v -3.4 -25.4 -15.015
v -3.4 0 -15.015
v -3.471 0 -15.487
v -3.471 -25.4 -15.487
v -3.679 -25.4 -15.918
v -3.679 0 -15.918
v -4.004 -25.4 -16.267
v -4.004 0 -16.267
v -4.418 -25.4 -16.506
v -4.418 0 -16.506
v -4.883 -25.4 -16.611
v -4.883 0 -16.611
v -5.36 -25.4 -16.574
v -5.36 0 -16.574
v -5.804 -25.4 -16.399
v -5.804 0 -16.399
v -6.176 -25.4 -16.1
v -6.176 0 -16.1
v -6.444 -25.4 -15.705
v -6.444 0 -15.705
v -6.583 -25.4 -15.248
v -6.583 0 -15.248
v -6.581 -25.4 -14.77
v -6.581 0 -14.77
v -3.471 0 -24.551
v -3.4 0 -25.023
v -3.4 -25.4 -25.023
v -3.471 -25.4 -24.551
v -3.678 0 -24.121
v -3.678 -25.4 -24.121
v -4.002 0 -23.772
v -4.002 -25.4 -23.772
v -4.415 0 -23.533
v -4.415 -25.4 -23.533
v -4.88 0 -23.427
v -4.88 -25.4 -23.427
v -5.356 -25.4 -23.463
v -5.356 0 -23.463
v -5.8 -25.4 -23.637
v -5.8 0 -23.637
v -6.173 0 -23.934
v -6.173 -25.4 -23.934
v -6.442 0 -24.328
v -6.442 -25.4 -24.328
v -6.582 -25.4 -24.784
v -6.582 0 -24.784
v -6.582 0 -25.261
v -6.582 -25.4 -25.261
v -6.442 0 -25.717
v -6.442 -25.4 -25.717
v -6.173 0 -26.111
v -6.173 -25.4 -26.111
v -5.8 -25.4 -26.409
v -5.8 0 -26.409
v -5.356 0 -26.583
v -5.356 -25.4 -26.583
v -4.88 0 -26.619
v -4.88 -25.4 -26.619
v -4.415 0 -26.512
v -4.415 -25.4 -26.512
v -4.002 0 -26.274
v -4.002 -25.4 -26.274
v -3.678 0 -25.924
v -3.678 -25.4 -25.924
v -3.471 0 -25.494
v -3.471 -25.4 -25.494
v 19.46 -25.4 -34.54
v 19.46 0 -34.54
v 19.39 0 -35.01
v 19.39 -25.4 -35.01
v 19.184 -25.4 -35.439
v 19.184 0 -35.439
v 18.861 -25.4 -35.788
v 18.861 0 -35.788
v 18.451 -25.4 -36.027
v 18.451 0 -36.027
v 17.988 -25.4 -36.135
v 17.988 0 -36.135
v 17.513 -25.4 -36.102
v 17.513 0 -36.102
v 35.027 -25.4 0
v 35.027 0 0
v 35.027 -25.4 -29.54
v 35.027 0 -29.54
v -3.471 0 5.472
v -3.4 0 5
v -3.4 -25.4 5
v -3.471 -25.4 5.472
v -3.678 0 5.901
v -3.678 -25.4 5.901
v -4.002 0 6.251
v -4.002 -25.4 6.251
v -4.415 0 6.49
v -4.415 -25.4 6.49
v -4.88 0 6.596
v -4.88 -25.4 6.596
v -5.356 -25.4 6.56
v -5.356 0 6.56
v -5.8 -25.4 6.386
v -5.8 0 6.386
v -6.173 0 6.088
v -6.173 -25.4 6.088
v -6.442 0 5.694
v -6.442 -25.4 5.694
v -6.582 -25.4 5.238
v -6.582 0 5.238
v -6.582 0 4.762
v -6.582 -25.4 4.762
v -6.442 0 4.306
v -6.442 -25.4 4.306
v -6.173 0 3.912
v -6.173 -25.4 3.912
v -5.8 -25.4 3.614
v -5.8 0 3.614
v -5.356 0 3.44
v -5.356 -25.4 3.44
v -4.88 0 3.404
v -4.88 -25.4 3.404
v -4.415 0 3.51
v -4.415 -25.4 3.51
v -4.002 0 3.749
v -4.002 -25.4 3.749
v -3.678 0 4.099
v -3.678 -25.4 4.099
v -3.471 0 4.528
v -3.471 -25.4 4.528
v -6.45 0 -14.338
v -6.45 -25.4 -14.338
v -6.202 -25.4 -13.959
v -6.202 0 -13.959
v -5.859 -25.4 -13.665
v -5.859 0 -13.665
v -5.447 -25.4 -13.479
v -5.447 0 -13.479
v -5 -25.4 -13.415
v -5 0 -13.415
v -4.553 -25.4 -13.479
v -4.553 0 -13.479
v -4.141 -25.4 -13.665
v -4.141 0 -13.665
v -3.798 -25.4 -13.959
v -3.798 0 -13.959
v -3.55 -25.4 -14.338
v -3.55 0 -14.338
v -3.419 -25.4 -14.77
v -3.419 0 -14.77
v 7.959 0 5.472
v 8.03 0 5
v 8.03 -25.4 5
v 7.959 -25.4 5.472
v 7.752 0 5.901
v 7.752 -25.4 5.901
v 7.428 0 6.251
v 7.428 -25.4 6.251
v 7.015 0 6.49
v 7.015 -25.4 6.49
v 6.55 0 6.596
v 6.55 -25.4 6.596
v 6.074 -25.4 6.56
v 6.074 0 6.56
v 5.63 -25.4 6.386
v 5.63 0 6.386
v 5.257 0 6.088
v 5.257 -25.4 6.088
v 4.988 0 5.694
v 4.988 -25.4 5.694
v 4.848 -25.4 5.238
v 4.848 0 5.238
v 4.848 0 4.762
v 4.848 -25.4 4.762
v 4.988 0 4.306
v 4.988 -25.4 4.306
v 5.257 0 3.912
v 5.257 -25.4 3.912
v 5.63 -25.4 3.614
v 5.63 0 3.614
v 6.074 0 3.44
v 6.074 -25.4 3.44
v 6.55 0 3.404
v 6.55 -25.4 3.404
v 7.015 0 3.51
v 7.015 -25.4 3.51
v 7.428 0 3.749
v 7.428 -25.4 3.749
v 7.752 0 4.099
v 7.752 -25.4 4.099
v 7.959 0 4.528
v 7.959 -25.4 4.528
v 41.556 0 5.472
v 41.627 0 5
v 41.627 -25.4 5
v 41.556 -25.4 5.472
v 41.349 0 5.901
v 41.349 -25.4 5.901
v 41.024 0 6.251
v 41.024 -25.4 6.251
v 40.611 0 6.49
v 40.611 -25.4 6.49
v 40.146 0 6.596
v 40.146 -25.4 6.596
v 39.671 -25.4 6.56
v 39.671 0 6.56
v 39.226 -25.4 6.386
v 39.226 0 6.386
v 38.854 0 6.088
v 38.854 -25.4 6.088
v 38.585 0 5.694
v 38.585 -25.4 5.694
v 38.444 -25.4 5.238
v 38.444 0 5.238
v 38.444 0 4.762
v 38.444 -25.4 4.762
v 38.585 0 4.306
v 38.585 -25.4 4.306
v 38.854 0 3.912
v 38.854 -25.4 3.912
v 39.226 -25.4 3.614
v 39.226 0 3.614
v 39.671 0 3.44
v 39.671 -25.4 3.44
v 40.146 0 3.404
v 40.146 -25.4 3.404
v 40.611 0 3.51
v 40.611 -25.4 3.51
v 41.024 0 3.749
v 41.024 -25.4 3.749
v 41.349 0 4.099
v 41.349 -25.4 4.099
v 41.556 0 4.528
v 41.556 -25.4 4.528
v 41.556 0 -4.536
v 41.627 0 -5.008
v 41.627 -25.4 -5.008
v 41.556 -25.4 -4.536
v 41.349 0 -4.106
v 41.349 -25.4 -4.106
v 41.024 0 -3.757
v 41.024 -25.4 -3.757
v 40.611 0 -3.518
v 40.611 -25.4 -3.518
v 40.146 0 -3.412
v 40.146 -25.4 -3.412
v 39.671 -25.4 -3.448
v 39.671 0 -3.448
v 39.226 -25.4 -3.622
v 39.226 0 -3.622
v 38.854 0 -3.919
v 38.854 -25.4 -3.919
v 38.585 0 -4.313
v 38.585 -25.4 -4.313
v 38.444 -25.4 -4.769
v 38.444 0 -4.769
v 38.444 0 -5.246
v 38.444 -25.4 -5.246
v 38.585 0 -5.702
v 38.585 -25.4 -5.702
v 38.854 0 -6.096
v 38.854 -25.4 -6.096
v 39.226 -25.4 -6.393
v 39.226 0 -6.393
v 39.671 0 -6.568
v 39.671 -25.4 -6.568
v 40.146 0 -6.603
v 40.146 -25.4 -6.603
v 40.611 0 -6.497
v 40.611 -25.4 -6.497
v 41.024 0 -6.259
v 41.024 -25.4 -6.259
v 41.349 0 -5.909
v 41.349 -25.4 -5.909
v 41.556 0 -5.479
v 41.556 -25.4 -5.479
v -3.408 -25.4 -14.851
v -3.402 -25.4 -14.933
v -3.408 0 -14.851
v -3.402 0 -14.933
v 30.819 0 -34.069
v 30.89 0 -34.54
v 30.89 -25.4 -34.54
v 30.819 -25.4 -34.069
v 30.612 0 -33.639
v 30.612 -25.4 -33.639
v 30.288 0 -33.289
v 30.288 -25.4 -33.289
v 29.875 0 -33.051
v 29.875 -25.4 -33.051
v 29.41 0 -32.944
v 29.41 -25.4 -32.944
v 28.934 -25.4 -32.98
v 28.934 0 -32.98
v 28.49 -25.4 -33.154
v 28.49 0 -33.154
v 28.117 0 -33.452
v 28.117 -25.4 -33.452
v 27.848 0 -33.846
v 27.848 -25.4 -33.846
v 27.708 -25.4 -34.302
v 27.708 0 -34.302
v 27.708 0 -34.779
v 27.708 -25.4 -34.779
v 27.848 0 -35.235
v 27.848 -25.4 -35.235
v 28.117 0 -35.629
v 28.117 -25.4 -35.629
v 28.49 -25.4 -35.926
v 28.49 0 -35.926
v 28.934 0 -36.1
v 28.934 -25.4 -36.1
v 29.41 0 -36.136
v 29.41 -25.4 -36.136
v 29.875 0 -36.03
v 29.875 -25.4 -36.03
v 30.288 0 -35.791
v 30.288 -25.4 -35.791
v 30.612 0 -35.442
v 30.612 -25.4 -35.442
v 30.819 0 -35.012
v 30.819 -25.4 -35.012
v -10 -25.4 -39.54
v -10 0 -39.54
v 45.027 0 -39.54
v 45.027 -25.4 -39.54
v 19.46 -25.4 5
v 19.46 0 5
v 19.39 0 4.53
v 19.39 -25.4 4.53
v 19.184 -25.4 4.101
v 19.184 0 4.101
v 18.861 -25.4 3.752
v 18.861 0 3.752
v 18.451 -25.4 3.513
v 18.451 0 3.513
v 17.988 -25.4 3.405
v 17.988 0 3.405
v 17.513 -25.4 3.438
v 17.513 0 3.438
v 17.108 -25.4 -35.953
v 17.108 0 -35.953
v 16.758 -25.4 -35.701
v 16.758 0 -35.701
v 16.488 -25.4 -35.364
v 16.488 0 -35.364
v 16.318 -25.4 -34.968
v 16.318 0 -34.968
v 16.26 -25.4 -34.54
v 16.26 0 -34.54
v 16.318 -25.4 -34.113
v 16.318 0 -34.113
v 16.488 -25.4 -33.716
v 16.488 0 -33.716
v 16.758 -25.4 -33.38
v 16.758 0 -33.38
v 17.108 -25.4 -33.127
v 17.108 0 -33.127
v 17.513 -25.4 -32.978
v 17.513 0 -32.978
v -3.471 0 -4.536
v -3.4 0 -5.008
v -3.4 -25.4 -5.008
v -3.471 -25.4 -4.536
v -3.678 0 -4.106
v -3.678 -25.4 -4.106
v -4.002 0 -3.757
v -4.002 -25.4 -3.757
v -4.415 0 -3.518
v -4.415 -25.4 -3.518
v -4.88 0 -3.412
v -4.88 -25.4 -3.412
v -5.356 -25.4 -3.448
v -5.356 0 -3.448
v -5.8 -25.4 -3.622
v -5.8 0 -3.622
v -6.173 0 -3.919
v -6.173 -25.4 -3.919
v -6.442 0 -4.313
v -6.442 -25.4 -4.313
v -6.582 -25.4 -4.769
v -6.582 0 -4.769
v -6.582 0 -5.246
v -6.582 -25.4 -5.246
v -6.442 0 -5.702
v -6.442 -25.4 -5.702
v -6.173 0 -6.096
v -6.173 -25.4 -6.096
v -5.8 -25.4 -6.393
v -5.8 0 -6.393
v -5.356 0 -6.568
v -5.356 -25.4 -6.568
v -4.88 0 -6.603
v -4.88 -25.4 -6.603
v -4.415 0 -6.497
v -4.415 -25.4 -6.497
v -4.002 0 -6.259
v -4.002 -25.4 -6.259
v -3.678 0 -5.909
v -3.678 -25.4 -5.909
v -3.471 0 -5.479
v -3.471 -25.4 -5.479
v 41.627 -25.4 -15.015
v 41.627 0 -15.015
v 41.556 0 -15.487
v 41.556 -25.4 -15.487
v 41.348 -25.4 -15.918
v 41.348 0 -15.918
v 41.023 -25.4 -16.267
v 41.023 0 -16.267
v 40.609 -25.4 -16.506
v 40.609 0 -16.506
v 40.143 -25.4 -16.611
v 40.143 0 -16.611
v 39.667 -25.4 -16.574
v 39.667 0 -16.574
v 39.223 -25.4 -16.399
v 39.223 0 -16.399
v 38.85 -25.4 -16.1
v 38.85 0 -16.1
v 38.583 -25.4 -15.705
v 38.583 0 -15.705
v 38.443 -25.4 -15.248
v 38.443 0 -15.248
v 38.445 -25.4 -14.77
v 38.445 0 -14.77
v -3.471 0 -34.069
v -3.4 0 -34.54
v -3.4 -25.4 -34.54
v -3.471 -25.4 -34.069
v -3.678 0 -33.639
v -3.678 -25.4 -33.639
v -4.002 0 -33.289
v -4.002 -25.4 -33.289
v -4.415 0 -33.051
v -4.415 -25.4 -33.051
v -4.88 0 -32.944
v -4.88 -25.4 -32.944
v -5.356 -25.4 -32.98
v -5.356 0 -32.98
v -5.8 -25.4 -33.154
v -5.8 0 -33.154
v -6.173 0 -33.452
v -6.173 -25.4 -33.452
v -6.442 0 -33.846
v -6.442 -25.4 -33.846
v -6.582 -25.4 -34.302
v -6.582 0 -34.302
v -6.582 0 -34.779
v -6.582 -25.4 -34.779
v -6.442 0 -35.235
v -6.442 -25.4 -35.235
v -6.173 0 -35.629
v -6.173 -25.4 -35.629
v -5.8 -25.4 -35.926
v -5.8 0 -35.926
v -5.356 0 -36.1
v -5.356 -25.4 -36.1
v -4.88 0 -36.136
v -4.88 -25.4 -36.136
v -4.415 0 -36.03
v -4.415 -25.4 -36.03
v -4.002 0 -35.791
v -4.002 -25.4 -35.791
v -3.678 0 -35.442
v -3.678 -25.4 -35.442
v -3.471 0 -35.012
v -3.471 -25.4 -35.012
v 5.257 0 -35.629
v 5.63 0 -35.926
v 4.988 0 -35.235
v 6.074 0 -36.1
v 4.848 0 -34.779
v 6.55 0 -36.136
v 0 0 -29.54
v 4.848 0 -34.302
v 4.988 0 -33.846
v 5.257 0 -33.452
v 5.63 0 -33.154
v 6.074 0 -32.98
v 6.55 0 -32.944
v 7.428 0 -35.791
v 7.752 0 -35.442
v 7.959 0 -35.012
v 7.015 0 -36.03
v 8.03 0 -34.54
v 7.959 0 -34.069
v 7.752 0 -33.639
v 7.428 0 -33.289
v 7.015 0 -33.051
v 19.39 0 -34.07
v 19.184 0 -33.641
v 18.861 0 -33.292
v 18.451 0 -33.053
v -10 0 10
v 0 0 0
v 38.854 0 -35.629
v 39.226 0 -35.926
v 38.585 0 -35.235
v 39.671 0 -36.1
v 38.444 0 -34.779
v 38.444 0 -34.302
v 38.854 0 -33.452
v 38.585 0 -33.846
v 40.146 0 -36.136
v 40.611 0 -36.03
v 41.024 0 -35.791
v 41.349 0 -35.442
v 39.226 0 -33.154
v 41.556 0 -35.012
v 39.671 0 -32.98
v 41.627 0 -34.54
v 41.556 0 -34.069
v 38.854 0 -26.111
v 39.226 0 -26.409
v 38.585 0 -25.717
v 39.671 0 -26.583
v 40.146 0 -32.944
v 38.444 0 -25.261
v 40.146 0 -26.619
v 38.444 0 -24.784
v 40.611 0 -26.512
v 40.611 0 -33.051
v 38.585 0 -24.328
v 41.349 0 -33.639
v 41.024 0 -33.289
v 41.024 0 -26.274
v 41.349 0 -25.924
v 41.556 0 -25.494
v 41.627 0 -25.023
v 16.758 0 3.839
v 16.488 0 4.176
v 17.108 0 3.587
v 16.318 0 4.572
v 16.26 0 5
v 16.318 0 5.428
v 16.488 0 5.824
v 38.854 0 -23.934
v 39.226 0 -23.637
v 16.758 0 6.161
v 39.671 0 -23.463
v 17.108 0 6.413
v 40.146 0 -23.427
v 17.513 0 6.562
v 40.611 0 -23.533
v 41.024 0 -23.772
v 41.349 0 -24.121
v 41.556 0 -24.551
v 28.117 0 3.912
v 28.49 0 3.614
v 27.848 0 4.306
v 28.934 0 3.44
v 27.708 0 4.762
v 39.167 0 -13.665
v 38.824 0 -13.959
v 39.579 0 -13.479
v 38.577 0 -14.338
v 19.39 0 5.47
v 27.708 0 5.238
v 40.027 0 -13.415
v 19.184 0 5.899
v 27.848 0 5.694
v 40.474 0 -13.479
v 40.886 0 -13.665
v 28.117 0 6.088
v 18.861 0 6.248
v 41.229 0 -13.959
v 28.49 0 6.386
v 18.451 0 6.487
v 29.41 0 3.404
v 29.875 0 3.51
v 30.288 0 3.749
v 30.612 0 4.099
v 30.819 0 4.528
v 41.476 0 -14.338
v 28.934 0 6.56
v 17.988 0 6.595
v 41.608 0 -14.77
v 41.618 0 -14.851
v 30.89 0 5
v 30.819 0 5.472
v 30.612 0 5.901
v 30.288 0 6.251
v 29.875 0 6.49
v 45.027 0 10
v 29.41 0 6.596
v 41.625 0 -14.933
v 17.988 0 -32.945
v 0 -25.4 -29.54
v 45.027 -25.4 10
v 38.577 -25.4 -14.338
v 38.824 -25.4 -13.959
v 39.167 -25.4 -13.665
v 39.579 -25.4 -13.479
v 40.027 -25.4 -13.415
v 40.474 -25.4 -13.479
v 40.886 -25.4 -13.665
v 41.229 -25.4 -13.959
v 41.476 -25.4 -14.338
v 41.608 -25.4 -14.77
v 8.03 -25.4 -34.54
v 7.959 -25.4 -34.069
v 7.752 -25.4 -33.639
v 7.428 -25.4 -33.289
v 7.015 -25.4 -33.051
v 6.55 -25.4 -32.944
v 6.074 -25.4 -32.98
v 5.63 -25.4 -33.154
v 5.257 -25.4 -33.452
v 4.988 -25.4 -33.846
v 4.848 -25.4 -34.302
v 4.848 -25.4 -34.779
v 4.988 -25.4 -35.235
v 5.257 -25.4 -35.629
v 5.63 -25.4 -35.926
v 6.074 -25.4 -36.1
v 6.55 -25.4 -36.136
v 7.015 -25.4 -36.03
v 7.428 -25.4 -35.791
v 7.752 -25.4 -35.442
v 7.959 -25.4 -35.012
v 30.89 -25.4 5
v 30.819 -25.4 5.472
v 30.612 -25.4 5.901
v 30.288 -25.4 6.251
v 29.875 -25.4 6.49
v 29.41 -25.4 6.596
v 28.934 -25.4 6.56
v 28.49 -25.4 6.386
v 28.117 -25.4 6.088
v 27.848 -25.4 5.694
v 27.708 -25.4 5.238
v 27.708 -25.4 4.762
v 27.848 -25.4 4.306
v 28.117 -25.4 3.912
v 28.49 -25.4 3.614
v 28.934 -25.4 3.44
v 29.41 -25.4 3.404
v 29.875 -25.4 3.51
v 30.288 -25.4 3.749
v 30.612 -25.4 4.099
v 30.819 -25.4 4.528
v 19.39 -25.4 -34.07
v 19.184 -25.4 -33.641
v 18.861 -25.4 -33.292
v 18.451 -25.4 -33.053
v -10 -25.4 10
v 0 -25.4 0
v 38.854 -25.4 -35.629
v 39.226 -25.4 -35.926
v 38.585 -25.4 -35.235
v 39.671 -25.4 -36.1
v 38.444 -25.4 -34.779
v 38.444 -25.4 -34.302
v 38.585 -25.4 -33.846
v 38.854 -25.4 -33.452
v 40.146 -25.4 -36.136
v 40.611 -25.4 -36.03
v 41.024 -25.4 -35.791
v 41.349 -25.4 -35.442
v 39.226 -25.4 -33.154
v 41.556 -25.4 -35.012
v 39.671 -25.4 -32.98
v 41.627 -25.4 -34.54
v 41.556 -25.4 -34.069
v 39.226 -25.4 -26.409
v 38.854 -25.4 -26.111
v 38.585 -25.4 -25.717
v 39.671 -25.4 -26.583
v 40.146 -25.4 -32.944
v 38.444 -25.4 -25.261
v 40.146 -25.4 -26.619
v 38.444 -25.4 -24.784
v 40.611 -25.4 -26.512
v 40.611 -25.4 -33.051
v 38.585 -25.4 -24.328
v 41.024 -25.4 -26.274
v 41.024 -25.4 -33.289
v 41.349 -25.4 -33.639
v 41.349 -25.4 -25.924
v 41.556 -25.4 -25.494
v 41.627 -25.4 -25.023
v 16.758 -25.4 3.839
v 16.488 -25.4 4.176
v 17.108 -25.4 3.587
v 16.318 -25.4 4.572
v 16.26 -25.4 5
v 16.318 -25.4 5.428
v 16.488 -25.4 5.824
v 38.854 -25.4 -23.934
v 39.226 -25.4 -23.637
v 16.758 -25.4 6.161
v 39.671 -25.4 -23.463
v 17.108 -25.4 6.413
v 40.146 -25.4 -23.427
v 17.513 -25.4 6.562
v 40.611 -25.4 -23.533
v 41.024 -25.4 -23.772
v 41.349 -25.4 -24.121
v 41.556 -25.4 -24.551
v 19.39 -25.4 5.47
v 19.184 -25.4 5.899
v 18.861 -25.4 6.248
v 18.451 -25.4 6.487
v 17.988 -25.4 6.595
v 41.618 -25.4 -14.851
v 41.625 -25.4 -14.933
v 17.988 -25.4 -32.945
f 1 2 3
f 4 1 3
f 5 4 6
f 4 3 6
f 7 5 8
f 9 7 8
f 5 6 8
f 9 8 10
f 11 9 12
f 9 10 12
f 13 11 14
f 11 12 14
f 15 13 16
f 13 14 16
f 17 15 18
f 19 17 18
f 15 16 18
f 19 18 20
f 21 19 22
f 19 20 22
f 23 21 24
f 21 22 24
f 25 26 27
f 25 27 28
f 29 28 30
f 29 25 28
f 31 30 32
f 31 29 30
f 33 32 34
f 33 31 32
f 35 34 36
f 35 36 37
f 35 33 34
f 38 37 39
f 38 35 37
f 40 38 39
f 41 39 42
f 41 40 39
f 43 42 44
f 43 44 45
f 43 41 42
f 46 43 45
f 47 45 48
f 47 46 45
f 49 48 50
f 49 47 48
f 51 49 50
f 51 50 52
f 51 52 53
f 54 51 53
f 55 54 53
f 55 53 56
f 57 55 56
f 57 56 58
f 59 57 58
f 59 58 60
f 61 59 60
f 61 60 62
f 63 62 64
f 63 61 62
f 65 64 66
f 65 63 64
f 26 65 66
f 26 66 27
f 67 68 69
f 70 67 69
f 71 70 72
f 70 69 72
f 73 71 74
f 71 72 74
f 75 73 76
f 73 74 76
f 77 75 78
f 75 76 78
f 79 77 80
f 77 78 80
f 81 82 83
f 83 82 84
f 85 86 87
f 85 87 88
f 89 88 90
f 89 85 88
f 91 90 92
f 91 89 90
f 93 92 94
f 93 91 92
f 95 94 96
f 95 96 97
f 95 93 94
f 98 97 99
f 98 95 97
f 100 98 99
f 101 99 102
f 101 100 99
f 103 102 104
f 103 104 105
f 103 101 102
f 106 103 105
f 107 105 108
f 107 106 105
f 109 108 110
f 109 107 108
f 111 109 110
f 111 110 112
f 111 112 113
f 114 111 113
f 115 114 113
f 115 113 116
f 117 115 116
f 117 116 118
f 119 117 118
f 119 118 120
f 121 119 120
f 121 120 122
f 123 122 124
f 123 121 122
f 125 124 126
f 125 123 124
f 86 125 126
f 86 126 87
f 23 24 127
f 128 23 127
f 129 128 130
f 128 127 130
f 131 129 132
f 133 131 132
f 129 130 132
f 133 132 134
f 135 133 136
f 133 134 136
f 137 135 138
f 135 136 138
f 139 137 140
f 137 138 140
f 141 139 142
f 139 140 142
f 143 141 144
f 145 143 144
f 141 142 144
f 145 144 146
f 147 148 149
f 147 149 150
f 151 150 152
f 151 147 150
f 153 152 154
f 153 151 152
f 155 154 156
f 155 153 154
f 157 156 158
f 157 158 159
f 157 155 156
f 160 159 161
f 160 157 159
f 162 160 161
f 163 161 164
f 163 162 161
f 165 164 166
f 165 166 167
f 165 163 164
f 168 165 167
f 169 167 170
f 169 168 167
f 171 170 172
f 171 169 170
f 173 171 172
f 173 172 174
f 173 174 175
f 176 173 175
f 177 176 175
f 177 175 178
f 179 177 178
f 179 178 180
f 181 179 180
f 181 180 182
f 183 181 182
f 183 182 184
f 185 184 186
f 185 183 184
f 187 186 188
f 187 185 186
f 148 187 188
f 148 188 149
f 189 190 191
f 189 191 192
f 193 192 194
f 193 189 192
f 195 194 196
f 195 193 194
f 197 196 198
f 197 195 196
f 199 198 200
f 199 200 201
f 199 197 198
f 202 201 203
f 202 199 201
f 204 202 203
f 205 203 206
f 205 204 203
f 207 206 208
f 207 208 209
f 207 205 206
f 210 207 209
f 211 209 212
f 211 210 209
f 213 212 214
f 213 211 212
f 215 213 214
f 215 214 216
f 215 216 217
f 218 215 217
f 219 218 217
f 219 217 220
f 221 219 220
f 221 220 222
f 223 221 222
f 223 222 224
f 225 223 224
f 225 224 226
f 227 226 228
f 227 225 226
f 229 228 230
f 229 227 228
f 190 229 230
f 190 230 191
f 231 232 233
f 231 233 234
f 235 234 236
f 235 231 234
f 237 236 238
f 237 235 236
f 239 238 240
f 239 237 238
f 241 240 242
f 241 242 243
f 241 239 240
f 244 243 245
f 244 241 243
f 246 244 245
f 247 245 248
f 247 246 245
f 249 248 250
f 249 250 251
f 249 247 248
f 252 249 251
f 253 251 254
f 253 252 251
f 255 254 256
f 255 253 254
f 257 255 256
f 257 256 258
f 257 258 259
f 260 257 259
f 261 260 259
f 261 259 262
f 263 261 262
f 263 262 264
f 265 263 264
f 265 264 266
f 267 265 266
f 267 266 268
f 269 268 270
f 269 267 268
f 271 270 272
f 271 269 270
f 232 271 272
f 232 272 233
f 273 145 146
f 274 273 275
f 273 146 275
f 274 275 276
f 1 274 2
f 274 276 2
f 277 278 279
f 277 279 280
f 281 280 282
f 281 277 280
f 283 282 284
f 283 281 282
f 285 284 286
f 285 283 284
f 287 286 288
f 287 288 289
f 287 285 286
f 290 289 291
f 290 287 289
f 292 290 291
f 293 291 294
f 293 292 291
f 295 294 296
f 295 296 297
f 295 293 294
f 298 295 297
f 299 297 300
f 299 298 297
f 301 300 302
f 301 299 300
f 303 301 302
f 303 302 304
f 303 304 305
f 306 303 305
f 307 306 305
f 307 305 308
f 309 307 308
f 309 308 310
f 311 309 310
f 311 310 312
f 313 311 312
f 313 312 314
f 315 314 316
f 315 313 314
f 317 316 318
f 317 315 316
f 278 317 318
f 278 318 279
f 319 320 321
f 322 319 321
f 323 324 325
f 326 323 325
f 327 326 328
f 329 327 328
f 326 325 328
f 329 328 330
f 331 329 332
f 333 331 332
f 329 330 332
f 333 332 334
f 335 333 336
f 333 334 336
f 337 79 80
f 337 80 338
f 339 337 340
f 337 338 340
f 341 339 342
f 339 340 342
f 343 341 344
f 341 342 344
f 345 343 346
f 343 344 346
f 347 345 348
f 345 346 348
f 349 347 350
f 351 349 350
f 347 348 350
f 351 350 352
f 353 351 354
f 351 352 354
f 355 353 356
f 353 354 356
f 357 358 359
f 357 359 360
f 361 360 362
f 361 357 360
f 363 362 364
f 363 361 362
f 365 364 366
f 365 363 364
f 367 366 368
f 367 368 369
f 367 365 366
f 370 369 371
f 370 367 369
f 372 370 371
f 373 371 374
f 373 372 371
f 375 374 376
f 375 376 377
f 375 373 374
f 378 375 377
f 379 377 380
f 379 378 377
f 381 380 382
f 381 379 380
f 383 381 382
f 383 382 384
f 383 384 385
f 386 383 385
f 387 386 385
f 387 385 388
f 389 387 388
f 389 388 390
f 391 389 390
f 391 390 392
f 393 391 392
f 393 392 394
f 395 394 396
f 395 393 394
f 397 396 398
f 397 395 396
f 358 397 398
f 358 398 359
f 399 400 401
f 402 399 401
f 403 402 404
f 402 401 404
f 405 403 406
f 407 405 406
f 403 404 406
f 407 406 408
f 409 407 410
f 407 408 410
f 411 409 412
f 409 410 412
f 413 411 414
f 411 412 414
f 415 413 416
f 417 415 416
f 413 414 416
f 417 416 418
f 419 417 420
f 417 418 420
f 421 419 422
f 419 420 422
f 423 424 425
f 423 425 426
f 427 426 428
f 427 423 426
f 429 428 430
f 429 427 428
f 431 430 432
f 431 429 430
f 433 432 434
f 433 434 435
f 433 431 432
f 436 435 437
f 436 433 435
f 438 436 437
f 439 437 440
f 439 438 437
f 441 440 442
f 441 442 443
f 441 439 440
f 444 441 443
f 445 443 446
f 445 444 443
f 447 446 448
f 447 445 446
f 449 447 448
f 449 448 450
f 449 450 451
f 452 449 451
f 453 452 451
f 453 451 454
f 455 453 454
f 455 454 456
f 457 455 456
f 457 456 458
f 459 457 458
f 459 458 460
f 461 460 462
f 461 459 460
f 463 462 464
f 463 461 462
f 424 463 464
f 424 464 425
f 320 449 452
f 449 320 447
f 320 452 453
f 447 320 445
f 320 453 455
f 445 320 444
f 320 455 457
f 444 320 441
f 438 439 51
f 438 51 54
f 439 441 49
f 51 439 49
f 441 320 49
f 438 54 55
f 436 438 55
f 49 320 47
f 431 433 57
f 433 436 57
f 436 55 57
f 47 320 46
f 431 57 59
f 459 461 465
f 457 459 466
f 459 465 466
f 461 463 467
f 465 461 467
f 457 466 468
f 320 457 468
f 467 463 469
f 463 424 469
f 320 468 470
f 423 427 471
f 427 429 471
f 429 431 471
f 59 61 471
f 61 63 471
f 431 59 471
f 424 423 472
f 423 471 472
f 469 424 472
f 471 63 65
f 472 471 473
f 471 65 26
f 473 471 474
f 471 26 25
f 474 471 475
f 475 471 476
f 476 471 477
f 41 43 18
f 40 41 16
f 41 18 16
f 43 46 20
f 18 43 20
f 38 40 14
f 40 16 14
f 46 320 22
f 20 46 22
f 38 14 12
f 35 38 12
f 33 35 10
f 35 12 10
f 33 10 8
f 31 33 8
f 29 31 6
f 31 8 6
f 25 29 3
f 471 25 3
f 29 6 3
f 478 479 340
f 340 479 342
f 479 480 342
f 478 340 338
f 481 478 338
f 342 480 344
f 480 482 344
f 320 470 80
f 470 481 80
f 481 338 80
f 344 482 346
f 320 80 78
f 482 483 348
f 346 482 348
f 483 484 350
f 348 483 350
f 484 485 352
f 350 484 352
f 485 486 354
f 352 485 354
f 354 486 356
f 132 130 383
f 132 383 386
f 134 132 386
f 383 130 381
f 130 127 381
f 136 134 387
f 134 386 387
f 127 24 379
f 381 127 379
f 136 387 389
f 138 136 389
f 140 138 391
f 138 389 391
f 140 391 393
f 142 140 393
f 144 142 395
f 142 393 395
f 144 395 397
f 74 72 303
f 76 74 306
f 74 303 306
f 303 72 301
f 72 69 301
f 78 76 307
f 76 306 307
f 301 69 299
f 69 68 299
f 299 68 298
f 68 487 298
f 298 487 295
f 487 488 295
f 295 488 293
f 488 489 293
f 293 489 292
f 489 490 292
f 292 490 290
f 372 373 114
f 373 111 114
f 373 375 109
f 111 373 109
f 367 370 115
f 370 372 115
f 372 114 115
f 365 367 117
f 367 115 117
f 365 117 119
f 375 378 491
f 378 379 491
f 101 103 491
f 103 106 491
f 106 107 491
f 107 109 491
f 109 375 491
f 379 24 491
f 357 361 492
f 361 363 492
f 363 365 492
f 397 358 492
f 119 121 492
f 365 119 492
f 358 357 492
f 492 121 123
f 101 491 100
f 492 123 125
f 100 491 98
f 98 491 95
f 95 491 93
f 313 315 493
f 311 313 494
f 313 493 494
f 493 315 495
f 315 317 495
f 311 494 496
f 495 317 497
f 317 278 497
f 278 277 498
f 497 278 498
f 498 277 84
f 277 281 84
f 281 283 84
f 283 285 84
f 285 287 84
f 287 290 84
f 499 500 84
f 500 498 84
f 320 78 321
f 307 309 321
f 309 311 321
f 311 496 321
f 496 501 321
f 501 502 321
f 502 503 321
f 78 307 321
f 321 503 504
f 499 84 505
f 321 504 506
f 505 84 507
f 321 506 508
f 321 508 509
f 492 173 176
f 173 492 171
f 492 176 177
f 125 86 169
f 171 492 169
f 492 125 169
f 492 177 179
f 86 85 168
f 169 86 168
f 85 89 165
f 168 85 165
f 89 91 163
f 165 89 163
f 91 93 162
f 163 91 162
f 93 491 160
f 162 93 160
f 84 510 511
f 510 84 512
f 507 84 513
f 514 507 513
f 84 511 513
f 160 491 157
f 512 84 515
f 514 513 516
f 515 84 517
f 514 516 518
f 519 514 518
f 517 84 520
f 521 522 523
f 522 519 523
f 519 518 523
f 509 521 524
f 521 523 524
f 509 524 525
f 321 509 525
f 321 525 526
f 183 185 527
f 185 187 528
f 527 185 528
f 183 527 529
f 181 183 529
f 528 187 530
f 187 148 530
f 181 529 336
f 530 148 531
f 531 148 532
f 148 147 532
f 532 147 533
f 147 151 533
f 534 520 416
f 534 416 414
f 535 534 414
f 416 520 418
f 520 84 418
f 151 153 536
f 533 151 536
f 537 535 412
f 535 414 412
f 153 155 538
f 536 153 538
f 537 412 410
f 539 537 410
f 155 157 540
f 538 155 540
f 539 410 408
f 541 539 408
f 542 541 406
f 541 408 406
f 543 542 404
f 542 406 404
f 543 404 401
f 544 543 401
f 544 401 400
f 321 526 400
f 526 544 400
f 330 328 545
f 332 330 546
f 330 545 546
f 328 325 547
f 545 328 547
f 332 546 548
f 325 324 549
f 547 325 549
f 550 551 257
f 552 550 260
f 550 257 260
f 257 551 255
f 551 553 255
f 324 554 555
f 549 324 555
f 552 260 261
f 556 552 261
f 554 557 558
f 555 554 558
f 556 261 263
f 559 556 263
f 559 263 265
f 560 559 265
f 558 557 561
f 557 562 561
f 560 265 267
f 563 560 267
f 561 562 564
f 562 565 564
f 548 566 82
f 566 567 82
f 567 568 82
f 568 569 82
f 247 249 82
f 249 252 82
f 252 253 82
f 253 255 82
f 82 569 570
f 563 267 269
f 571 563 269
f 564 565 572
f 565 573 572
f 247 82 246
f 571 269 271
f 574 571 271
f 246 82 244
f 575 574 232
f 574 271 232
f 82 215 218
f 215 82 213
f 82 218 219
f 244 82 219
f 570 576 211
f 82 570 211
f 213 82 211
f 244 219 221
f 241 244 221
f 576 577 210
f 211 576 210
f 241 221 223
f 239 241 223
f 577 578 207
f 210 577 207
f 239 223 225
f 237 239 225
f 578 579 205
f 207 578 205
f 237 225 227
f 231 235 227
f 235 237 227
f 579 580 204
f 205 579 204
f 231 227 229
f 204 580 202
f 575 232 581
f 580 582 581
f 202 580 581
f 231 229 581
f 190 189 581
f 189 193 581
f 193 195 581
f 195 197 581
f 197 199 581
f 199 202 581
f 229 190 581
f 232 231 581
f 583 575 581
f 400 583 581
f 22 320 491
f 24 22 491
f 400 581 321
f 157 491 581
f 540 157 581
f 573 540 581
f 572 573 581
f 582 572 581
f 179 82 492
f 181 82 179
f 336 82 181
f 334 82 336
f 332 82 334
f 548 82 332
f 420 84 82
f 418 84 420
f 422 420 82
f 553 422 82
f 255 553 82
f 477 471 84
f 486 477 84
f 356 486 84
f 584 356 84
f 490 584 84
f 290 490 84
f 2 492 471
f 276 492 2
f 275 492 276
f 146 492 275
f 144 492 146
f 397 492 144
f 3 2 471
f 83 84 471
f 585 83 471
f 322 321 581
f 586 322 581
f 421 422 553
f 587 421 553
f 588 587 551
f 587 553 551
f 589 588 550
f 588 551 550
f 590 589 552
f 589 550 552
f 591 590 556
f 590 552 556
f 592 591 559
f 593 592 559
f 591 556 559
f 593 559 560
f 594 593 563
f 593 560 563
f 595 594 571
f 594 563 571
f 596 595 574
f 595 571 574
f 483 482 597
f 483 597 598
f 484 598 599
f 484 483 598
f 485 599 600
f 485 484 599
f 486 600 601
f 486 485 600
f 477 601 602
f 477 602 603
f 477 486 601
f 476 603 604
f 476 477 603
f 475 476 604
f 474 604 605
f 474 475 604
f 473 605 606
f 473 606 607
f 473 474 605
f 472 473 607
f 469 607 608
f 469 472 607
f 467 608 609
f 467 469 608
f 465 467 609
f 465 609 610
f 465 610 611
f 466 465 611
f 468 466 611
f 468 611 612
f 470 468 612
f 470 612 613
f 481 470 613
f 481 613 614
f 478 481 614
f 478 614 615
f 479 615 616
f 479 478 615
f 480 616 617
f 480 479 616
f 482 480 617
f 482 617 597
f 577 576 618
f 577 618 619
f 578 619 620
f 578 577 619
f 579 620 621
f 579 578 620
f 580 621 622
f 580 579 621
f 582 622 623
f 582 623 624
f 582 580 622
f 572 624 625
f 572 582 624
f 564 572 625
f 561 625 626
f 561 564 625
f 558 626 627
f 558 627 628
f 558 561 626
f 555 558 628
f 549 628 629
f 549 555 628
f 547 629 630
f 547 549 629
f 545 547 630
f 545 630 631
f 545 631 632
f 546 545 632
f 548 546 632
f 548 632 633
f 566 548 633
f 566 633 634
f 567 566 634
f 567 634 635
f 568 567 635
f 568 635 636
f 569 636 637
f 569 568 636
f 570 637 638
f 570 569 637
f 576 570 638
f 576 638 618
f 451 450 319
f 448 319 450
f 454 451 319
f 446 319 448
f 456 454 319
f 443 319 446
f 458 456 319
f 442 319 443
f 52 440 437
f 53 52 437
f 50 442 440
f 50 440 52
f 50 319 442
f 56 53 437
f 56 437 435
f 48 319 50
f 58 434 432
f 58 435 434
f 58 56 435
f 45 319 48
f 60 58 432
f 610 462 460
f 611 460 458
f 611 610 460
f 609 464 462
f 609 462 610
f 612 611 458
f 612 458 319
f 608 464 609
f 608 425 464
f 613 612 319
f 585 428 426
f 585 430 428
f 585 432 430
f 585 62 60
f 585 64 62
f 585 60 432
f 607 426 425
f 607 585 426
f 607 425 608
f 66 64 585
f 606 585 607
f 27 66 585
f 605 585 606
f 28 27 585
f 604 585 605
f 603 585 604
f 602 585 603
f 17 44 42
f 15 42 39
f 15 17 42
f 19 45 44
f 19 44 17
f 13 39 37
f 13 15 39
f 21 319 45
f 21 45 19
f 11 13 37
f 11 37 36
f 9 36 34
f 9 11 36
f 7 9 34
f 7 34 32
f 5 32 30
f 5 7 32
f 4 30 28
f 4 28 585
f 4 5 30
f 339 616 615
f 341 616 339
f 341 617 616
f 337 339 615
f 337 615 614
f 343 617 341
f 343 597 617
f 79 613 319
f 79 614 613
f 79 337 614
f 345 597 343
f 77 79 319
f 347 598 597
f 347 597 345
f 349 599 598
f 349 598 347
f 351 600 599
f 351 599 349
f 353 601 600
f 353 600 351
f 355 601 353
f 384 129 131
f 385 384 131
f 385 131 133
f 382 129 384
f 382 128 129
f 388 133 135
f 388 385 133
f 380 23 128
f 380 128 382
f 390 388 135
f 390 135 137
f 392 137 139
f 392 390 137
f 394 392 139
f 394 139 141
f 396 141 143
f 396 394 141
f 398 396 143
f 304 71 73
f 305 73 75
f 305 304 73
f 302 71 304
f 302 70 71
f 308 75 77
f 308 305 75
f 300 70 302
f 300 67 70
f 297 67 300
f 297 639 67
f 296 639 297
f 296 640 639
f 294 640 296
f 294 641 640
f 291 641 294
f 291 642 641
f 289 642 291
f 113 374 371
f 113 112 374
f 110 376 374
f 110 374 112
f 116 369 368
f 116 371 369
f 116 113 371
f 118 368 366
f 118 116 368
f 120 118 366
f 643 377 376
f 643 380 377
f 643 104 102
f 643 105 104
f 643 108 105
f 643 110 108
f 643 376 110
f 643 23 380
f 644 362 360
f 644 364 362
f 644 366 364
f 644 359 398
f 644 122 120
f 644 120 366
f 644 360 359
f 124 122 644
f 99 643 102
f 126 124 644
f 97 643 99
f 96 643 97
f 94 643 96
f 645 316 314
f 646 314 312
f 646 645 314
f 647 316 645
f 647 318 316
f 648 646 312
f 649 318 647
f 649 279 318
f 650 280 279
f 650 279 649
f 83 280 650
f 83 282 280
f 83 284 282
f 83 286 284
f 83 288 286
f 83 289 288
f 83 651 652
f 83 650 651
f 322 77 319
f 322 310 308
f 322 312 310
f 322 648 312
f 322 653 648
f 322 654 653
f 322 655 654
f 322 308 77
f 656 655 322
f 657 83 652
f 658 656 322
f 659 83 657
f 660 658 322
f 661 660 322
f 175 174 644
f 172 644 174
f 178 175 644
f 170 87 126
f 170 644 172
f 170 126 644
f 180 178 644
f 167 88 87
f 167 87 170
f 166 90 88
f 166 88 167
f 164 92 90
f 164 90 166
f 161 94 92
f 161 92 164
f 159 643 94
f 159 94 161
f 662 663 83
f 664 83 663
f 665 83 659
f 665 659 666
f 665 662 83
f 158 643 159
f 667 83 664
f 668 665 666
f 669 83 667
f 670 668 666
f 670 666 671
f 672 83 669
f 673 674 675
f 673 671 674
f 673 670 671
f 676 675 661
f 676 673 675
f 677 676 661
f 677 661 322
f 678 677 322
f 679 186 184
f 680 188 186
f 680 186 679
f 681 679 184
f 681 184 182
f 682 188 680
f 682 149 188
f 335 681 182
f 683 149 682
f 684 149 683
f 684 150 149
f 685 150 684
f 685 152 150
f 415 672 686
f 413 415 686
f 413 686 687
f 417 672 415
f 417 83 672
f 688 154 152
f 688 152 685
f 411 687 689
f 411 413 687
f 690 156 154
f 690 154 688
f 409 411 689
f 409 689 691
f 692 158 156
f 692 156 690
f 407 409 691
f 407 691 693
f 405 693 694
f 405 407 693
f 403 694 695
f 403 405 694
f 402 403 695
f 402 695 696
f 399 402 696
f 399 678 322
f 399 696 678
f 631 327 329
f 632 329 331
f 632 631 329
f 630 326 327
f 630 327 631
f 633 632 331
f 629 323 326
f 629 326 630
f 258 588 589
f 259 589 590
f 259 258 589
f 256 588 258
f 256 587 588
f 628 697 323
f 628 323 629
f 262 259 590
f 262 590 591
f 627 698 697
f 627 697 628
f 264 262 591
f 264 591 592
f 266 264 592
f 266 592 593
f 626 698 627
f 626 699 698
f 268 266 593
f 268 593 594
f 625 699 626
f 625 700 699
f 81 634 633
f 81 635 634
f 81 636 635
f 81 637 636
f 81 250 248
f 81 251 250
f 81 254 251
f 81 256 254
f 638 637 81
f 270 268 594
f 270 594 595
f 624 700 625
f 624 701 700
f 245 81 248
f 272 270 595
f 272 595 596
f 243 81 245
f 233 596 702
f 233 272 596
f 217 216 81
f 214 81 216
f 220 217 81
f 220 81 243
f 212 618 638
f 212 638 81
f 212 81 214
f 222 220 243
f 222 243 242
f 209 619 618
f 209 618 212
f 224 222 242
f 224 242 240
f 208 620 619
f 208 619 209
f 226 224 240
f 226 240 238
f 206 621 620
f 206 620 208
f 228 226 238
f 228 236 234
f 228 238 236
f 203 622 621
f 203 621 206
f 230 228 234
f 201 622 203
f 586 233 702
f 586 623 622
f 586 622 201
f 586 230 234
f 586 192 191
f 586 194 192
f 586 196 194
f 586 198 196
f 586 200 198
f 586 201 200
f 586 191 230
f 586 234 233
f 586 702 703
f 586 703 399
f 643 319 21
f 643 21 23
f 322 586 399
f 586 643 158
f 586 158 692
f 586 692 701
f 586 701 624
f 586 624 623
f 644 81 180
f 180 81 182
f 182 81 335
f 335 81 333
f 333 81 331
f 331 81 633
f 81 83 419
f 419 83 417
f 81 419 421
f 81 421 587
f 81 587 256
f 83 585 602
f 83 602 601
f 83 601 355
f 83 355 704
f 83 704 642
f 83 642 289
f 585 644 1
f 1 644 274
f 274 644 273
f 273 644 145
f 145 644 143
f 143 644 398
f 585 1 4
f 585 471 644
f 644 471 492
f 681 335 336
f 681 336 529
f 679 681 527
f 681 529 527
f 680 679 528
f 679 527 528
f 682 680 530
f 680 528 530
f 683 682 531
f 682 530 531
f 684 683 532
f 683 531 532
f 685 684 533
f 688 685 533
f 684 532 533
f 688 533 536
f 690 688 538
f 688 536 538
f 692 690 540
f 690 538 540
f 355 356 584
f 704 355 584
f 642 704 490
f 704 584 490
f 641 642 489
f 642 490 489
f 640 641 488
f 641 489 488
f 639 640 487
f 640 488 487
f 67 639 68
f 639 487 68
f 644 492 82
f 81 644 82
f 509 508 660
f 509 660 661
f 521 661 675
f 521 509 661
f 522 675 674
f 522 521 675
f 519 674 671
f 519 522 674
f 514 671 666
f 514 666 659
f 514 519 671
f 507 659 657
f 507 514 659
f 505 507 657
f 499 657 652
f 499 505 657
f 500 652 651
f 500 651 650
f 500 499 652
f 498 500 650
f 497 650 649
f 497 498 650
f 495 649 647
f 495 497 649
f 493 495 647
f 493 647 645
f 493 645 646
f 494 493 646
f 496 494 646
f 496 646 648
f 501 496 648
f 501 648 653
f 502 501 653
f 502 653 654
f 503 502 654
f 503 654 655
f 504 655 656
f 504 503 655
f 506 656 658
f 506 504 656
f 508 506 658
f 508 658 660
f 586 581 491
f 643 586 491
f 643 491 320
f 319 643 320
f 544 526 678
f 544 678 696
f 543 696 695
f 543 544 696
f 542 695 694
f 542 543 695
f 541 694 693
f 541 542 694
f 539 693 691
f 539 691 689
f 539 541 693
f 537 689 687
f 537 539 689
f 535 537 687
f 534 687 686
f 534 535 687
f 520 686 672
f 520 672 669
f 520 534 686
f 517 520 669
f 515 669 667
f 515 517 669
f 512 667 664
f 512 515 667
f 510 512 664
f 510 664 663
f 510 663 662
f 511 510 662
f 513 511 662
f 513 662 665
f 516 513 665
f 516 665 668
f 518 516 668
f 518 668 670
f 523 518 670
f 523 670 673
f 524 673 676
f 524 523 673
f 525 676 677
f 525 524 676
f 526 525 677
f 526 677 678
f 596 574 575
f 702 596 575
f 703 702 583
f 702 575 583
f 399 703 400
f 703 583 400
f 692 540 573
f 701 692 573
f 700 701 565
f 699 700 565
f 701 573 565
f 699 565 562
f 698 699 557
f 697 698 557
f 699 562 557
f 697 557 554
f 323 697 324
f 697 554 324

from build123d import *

# Parameters (mm, degrees)
F0_R     = 1.6002
F1_DEPTH = 25.4


with BuildPart() as f1:
    # F0 (on Front) → F1 (new body)
    with BuildSketch(Plane.XZ):
        with BuildLine():
            Line((0, -14.7701), (0, 0))
            Line((0, 0), (17.5133, 0))
            Line((17.5133, 0), (17.5133, 3.43781))
            ThreePointArc((17.5133, 3.43781), (16.2598, 5), (17.5133, 6.56219))
            Line((17.5133, 6.56219), (17.5133, 10))
            Line((17.5133, 10), (-10, 10))
            Line((-10, 10), (-10, -14.7701))
            Line((-10, -14.7701), (-6.581318, -14.7701))
            ThreePointArc((-6.581318, -14.7701), (-5, -13.415), (-3.418682, -14.7701))
            Line((-3.418682, -14.7701), (0, -14.7701))
        make_face()
        with Locations((-5, -5.0076)):
            Circle(F0_R, mode=Mode.SUBTRACT)
        with Locations((-5, 5)):
            Circle(F0_R, mode=Mode.SUBTRACT)
        with Locations((6.43, 5)):
            Circle(F0_R, mode=Mode.SUBTRACT)
        with BuildLine():
            Line((17.5133, 3.43781), (17.5133, 0))
            Line((17.5133, 0), (35.0266, 0))
            Line((35.0266, 0), (35.0266, -14.7701))
            Line((35.0266, -14.7701), (38.445282, -14.7701))
            ThreePointArc((38.445282, -14.7701), (40.0266, -13.415), (41.607918, -14.7701))
            Line((41.607918, -14.7701), (45.0266, -14.7701))
            Line((45.0266, -14.7701), (45.0266, 10))
            Line((45.0266, 10), (17.5133, 10))
            Line((17.5133, 10), (17.5133, 6.56219))
            ThreePointArc((17.5133, 6.56219), (18.861462, 6.248084), (19.4602, 5))
            ThreePointArc((19.4602, 5), (18.861462, 3.751916), (17.5133, 3.43781))
        make_face()
        with Locations((40.0266, -5.0076)):
            Circle(F0_R, mode=Mode.SUBTRACT)
        with Locations((29.29, 5)):
            Circle(F0_R, mode=Mode.SUBTRACT)
        with Locations((40.0266, 5)):
            Circle(F0_R, mode=Mode.SUBTRACT)
        with BuildLine():
            Line((38.445282, -14.7701), (35.0266, -14.7701))
            Line((35.0266, -14.7701), (35.0266, -29.5402))
            Line((35.0266, -29.5402), (17.5133, -29.5402))
            Line((17.5133, -29.5402), (17.5133, -32.97801))
            ThreePointArc((17.5133, -32.97801), (18.861462, -33.292116), (19.4602, -34.5402))
            ThreePointArc((19.4602, -34.5402), (18.861462, -35.788284), (17.5133, -36.10239))
            Line((17.5133, -36.10239), (17.5133, -39.5402))
            Line((17.5133, -39.5402), (45.0266, -39.5402))
            Line((45.0266, -39.5402), (45.0266, -14.7701))
            Line((45.0266, -14.7701), (41.607918, -14.7701))
            ThreePointArc((41.607918, -14.7701), (41.622072, -14.892287), (41.6268, -15.0152))
            ThreePointArc((41.6268, -15.0152), (39.903687, -16.610672), (38.445282, -14.7701))
        make_face()
        with Locations((29.29, -34.5402)):
            Circle(F0_R, mode=Mode.SUBTRACT)
        with Locations((40.0266, -34.5402)):
            Circle(F0_R, mode=Mode.SUBTRACT)
        with Locations((40.0266, -25.0228)):
            Circle(F0_R, mode=Mode.SUBTRACT)
        with BuildLine():
            Line((0, -29.5402), (0, -14.7701))
            Line((0, -14.7701), (-3.418682, -14.7701))
            ThreePointArc((-3.418682, -14.7701), (-3.404528, -14.892287), (-3.3998, -15.0152))
            ThreePointArc((-3.3998, -15.0152), (-5.122913, -16.610672), (-6.581318, -14.7701))
            Line((-6.581318, -14.7701), (-10, -14.7701))
            Line((-10, -14.7701), (-10, -39.5402))
            Line((-10, -39.5402), (17.5133, -39.5402))
            Line((17.5133, -39.5402), (17.5133, -36.10239))
            ThreePointArc((17.5133, -36.10239), (16.2598, -34.5402), (17.5133, -32.97801))
            Line((17.5133, -32.97801), (17.5133, -29.5402))
            Line((17.5133, -29.5402), (0, -29.5402))
        make_face()
        with Locations((-5, -34.5402)):
            Circle(F0_R, mode=Mode.SUBTRACT)
        with Locations((6.43, -34.5402)):
            Circle(F0_R, mode=Mode.SUBTRACT)
        with Locations((-5, -25.0228)):
            Circle(F0_R, mode=Mode.SUBTRACT)
    extrude(amount=F1_DEPTH)


solid = f1.part
